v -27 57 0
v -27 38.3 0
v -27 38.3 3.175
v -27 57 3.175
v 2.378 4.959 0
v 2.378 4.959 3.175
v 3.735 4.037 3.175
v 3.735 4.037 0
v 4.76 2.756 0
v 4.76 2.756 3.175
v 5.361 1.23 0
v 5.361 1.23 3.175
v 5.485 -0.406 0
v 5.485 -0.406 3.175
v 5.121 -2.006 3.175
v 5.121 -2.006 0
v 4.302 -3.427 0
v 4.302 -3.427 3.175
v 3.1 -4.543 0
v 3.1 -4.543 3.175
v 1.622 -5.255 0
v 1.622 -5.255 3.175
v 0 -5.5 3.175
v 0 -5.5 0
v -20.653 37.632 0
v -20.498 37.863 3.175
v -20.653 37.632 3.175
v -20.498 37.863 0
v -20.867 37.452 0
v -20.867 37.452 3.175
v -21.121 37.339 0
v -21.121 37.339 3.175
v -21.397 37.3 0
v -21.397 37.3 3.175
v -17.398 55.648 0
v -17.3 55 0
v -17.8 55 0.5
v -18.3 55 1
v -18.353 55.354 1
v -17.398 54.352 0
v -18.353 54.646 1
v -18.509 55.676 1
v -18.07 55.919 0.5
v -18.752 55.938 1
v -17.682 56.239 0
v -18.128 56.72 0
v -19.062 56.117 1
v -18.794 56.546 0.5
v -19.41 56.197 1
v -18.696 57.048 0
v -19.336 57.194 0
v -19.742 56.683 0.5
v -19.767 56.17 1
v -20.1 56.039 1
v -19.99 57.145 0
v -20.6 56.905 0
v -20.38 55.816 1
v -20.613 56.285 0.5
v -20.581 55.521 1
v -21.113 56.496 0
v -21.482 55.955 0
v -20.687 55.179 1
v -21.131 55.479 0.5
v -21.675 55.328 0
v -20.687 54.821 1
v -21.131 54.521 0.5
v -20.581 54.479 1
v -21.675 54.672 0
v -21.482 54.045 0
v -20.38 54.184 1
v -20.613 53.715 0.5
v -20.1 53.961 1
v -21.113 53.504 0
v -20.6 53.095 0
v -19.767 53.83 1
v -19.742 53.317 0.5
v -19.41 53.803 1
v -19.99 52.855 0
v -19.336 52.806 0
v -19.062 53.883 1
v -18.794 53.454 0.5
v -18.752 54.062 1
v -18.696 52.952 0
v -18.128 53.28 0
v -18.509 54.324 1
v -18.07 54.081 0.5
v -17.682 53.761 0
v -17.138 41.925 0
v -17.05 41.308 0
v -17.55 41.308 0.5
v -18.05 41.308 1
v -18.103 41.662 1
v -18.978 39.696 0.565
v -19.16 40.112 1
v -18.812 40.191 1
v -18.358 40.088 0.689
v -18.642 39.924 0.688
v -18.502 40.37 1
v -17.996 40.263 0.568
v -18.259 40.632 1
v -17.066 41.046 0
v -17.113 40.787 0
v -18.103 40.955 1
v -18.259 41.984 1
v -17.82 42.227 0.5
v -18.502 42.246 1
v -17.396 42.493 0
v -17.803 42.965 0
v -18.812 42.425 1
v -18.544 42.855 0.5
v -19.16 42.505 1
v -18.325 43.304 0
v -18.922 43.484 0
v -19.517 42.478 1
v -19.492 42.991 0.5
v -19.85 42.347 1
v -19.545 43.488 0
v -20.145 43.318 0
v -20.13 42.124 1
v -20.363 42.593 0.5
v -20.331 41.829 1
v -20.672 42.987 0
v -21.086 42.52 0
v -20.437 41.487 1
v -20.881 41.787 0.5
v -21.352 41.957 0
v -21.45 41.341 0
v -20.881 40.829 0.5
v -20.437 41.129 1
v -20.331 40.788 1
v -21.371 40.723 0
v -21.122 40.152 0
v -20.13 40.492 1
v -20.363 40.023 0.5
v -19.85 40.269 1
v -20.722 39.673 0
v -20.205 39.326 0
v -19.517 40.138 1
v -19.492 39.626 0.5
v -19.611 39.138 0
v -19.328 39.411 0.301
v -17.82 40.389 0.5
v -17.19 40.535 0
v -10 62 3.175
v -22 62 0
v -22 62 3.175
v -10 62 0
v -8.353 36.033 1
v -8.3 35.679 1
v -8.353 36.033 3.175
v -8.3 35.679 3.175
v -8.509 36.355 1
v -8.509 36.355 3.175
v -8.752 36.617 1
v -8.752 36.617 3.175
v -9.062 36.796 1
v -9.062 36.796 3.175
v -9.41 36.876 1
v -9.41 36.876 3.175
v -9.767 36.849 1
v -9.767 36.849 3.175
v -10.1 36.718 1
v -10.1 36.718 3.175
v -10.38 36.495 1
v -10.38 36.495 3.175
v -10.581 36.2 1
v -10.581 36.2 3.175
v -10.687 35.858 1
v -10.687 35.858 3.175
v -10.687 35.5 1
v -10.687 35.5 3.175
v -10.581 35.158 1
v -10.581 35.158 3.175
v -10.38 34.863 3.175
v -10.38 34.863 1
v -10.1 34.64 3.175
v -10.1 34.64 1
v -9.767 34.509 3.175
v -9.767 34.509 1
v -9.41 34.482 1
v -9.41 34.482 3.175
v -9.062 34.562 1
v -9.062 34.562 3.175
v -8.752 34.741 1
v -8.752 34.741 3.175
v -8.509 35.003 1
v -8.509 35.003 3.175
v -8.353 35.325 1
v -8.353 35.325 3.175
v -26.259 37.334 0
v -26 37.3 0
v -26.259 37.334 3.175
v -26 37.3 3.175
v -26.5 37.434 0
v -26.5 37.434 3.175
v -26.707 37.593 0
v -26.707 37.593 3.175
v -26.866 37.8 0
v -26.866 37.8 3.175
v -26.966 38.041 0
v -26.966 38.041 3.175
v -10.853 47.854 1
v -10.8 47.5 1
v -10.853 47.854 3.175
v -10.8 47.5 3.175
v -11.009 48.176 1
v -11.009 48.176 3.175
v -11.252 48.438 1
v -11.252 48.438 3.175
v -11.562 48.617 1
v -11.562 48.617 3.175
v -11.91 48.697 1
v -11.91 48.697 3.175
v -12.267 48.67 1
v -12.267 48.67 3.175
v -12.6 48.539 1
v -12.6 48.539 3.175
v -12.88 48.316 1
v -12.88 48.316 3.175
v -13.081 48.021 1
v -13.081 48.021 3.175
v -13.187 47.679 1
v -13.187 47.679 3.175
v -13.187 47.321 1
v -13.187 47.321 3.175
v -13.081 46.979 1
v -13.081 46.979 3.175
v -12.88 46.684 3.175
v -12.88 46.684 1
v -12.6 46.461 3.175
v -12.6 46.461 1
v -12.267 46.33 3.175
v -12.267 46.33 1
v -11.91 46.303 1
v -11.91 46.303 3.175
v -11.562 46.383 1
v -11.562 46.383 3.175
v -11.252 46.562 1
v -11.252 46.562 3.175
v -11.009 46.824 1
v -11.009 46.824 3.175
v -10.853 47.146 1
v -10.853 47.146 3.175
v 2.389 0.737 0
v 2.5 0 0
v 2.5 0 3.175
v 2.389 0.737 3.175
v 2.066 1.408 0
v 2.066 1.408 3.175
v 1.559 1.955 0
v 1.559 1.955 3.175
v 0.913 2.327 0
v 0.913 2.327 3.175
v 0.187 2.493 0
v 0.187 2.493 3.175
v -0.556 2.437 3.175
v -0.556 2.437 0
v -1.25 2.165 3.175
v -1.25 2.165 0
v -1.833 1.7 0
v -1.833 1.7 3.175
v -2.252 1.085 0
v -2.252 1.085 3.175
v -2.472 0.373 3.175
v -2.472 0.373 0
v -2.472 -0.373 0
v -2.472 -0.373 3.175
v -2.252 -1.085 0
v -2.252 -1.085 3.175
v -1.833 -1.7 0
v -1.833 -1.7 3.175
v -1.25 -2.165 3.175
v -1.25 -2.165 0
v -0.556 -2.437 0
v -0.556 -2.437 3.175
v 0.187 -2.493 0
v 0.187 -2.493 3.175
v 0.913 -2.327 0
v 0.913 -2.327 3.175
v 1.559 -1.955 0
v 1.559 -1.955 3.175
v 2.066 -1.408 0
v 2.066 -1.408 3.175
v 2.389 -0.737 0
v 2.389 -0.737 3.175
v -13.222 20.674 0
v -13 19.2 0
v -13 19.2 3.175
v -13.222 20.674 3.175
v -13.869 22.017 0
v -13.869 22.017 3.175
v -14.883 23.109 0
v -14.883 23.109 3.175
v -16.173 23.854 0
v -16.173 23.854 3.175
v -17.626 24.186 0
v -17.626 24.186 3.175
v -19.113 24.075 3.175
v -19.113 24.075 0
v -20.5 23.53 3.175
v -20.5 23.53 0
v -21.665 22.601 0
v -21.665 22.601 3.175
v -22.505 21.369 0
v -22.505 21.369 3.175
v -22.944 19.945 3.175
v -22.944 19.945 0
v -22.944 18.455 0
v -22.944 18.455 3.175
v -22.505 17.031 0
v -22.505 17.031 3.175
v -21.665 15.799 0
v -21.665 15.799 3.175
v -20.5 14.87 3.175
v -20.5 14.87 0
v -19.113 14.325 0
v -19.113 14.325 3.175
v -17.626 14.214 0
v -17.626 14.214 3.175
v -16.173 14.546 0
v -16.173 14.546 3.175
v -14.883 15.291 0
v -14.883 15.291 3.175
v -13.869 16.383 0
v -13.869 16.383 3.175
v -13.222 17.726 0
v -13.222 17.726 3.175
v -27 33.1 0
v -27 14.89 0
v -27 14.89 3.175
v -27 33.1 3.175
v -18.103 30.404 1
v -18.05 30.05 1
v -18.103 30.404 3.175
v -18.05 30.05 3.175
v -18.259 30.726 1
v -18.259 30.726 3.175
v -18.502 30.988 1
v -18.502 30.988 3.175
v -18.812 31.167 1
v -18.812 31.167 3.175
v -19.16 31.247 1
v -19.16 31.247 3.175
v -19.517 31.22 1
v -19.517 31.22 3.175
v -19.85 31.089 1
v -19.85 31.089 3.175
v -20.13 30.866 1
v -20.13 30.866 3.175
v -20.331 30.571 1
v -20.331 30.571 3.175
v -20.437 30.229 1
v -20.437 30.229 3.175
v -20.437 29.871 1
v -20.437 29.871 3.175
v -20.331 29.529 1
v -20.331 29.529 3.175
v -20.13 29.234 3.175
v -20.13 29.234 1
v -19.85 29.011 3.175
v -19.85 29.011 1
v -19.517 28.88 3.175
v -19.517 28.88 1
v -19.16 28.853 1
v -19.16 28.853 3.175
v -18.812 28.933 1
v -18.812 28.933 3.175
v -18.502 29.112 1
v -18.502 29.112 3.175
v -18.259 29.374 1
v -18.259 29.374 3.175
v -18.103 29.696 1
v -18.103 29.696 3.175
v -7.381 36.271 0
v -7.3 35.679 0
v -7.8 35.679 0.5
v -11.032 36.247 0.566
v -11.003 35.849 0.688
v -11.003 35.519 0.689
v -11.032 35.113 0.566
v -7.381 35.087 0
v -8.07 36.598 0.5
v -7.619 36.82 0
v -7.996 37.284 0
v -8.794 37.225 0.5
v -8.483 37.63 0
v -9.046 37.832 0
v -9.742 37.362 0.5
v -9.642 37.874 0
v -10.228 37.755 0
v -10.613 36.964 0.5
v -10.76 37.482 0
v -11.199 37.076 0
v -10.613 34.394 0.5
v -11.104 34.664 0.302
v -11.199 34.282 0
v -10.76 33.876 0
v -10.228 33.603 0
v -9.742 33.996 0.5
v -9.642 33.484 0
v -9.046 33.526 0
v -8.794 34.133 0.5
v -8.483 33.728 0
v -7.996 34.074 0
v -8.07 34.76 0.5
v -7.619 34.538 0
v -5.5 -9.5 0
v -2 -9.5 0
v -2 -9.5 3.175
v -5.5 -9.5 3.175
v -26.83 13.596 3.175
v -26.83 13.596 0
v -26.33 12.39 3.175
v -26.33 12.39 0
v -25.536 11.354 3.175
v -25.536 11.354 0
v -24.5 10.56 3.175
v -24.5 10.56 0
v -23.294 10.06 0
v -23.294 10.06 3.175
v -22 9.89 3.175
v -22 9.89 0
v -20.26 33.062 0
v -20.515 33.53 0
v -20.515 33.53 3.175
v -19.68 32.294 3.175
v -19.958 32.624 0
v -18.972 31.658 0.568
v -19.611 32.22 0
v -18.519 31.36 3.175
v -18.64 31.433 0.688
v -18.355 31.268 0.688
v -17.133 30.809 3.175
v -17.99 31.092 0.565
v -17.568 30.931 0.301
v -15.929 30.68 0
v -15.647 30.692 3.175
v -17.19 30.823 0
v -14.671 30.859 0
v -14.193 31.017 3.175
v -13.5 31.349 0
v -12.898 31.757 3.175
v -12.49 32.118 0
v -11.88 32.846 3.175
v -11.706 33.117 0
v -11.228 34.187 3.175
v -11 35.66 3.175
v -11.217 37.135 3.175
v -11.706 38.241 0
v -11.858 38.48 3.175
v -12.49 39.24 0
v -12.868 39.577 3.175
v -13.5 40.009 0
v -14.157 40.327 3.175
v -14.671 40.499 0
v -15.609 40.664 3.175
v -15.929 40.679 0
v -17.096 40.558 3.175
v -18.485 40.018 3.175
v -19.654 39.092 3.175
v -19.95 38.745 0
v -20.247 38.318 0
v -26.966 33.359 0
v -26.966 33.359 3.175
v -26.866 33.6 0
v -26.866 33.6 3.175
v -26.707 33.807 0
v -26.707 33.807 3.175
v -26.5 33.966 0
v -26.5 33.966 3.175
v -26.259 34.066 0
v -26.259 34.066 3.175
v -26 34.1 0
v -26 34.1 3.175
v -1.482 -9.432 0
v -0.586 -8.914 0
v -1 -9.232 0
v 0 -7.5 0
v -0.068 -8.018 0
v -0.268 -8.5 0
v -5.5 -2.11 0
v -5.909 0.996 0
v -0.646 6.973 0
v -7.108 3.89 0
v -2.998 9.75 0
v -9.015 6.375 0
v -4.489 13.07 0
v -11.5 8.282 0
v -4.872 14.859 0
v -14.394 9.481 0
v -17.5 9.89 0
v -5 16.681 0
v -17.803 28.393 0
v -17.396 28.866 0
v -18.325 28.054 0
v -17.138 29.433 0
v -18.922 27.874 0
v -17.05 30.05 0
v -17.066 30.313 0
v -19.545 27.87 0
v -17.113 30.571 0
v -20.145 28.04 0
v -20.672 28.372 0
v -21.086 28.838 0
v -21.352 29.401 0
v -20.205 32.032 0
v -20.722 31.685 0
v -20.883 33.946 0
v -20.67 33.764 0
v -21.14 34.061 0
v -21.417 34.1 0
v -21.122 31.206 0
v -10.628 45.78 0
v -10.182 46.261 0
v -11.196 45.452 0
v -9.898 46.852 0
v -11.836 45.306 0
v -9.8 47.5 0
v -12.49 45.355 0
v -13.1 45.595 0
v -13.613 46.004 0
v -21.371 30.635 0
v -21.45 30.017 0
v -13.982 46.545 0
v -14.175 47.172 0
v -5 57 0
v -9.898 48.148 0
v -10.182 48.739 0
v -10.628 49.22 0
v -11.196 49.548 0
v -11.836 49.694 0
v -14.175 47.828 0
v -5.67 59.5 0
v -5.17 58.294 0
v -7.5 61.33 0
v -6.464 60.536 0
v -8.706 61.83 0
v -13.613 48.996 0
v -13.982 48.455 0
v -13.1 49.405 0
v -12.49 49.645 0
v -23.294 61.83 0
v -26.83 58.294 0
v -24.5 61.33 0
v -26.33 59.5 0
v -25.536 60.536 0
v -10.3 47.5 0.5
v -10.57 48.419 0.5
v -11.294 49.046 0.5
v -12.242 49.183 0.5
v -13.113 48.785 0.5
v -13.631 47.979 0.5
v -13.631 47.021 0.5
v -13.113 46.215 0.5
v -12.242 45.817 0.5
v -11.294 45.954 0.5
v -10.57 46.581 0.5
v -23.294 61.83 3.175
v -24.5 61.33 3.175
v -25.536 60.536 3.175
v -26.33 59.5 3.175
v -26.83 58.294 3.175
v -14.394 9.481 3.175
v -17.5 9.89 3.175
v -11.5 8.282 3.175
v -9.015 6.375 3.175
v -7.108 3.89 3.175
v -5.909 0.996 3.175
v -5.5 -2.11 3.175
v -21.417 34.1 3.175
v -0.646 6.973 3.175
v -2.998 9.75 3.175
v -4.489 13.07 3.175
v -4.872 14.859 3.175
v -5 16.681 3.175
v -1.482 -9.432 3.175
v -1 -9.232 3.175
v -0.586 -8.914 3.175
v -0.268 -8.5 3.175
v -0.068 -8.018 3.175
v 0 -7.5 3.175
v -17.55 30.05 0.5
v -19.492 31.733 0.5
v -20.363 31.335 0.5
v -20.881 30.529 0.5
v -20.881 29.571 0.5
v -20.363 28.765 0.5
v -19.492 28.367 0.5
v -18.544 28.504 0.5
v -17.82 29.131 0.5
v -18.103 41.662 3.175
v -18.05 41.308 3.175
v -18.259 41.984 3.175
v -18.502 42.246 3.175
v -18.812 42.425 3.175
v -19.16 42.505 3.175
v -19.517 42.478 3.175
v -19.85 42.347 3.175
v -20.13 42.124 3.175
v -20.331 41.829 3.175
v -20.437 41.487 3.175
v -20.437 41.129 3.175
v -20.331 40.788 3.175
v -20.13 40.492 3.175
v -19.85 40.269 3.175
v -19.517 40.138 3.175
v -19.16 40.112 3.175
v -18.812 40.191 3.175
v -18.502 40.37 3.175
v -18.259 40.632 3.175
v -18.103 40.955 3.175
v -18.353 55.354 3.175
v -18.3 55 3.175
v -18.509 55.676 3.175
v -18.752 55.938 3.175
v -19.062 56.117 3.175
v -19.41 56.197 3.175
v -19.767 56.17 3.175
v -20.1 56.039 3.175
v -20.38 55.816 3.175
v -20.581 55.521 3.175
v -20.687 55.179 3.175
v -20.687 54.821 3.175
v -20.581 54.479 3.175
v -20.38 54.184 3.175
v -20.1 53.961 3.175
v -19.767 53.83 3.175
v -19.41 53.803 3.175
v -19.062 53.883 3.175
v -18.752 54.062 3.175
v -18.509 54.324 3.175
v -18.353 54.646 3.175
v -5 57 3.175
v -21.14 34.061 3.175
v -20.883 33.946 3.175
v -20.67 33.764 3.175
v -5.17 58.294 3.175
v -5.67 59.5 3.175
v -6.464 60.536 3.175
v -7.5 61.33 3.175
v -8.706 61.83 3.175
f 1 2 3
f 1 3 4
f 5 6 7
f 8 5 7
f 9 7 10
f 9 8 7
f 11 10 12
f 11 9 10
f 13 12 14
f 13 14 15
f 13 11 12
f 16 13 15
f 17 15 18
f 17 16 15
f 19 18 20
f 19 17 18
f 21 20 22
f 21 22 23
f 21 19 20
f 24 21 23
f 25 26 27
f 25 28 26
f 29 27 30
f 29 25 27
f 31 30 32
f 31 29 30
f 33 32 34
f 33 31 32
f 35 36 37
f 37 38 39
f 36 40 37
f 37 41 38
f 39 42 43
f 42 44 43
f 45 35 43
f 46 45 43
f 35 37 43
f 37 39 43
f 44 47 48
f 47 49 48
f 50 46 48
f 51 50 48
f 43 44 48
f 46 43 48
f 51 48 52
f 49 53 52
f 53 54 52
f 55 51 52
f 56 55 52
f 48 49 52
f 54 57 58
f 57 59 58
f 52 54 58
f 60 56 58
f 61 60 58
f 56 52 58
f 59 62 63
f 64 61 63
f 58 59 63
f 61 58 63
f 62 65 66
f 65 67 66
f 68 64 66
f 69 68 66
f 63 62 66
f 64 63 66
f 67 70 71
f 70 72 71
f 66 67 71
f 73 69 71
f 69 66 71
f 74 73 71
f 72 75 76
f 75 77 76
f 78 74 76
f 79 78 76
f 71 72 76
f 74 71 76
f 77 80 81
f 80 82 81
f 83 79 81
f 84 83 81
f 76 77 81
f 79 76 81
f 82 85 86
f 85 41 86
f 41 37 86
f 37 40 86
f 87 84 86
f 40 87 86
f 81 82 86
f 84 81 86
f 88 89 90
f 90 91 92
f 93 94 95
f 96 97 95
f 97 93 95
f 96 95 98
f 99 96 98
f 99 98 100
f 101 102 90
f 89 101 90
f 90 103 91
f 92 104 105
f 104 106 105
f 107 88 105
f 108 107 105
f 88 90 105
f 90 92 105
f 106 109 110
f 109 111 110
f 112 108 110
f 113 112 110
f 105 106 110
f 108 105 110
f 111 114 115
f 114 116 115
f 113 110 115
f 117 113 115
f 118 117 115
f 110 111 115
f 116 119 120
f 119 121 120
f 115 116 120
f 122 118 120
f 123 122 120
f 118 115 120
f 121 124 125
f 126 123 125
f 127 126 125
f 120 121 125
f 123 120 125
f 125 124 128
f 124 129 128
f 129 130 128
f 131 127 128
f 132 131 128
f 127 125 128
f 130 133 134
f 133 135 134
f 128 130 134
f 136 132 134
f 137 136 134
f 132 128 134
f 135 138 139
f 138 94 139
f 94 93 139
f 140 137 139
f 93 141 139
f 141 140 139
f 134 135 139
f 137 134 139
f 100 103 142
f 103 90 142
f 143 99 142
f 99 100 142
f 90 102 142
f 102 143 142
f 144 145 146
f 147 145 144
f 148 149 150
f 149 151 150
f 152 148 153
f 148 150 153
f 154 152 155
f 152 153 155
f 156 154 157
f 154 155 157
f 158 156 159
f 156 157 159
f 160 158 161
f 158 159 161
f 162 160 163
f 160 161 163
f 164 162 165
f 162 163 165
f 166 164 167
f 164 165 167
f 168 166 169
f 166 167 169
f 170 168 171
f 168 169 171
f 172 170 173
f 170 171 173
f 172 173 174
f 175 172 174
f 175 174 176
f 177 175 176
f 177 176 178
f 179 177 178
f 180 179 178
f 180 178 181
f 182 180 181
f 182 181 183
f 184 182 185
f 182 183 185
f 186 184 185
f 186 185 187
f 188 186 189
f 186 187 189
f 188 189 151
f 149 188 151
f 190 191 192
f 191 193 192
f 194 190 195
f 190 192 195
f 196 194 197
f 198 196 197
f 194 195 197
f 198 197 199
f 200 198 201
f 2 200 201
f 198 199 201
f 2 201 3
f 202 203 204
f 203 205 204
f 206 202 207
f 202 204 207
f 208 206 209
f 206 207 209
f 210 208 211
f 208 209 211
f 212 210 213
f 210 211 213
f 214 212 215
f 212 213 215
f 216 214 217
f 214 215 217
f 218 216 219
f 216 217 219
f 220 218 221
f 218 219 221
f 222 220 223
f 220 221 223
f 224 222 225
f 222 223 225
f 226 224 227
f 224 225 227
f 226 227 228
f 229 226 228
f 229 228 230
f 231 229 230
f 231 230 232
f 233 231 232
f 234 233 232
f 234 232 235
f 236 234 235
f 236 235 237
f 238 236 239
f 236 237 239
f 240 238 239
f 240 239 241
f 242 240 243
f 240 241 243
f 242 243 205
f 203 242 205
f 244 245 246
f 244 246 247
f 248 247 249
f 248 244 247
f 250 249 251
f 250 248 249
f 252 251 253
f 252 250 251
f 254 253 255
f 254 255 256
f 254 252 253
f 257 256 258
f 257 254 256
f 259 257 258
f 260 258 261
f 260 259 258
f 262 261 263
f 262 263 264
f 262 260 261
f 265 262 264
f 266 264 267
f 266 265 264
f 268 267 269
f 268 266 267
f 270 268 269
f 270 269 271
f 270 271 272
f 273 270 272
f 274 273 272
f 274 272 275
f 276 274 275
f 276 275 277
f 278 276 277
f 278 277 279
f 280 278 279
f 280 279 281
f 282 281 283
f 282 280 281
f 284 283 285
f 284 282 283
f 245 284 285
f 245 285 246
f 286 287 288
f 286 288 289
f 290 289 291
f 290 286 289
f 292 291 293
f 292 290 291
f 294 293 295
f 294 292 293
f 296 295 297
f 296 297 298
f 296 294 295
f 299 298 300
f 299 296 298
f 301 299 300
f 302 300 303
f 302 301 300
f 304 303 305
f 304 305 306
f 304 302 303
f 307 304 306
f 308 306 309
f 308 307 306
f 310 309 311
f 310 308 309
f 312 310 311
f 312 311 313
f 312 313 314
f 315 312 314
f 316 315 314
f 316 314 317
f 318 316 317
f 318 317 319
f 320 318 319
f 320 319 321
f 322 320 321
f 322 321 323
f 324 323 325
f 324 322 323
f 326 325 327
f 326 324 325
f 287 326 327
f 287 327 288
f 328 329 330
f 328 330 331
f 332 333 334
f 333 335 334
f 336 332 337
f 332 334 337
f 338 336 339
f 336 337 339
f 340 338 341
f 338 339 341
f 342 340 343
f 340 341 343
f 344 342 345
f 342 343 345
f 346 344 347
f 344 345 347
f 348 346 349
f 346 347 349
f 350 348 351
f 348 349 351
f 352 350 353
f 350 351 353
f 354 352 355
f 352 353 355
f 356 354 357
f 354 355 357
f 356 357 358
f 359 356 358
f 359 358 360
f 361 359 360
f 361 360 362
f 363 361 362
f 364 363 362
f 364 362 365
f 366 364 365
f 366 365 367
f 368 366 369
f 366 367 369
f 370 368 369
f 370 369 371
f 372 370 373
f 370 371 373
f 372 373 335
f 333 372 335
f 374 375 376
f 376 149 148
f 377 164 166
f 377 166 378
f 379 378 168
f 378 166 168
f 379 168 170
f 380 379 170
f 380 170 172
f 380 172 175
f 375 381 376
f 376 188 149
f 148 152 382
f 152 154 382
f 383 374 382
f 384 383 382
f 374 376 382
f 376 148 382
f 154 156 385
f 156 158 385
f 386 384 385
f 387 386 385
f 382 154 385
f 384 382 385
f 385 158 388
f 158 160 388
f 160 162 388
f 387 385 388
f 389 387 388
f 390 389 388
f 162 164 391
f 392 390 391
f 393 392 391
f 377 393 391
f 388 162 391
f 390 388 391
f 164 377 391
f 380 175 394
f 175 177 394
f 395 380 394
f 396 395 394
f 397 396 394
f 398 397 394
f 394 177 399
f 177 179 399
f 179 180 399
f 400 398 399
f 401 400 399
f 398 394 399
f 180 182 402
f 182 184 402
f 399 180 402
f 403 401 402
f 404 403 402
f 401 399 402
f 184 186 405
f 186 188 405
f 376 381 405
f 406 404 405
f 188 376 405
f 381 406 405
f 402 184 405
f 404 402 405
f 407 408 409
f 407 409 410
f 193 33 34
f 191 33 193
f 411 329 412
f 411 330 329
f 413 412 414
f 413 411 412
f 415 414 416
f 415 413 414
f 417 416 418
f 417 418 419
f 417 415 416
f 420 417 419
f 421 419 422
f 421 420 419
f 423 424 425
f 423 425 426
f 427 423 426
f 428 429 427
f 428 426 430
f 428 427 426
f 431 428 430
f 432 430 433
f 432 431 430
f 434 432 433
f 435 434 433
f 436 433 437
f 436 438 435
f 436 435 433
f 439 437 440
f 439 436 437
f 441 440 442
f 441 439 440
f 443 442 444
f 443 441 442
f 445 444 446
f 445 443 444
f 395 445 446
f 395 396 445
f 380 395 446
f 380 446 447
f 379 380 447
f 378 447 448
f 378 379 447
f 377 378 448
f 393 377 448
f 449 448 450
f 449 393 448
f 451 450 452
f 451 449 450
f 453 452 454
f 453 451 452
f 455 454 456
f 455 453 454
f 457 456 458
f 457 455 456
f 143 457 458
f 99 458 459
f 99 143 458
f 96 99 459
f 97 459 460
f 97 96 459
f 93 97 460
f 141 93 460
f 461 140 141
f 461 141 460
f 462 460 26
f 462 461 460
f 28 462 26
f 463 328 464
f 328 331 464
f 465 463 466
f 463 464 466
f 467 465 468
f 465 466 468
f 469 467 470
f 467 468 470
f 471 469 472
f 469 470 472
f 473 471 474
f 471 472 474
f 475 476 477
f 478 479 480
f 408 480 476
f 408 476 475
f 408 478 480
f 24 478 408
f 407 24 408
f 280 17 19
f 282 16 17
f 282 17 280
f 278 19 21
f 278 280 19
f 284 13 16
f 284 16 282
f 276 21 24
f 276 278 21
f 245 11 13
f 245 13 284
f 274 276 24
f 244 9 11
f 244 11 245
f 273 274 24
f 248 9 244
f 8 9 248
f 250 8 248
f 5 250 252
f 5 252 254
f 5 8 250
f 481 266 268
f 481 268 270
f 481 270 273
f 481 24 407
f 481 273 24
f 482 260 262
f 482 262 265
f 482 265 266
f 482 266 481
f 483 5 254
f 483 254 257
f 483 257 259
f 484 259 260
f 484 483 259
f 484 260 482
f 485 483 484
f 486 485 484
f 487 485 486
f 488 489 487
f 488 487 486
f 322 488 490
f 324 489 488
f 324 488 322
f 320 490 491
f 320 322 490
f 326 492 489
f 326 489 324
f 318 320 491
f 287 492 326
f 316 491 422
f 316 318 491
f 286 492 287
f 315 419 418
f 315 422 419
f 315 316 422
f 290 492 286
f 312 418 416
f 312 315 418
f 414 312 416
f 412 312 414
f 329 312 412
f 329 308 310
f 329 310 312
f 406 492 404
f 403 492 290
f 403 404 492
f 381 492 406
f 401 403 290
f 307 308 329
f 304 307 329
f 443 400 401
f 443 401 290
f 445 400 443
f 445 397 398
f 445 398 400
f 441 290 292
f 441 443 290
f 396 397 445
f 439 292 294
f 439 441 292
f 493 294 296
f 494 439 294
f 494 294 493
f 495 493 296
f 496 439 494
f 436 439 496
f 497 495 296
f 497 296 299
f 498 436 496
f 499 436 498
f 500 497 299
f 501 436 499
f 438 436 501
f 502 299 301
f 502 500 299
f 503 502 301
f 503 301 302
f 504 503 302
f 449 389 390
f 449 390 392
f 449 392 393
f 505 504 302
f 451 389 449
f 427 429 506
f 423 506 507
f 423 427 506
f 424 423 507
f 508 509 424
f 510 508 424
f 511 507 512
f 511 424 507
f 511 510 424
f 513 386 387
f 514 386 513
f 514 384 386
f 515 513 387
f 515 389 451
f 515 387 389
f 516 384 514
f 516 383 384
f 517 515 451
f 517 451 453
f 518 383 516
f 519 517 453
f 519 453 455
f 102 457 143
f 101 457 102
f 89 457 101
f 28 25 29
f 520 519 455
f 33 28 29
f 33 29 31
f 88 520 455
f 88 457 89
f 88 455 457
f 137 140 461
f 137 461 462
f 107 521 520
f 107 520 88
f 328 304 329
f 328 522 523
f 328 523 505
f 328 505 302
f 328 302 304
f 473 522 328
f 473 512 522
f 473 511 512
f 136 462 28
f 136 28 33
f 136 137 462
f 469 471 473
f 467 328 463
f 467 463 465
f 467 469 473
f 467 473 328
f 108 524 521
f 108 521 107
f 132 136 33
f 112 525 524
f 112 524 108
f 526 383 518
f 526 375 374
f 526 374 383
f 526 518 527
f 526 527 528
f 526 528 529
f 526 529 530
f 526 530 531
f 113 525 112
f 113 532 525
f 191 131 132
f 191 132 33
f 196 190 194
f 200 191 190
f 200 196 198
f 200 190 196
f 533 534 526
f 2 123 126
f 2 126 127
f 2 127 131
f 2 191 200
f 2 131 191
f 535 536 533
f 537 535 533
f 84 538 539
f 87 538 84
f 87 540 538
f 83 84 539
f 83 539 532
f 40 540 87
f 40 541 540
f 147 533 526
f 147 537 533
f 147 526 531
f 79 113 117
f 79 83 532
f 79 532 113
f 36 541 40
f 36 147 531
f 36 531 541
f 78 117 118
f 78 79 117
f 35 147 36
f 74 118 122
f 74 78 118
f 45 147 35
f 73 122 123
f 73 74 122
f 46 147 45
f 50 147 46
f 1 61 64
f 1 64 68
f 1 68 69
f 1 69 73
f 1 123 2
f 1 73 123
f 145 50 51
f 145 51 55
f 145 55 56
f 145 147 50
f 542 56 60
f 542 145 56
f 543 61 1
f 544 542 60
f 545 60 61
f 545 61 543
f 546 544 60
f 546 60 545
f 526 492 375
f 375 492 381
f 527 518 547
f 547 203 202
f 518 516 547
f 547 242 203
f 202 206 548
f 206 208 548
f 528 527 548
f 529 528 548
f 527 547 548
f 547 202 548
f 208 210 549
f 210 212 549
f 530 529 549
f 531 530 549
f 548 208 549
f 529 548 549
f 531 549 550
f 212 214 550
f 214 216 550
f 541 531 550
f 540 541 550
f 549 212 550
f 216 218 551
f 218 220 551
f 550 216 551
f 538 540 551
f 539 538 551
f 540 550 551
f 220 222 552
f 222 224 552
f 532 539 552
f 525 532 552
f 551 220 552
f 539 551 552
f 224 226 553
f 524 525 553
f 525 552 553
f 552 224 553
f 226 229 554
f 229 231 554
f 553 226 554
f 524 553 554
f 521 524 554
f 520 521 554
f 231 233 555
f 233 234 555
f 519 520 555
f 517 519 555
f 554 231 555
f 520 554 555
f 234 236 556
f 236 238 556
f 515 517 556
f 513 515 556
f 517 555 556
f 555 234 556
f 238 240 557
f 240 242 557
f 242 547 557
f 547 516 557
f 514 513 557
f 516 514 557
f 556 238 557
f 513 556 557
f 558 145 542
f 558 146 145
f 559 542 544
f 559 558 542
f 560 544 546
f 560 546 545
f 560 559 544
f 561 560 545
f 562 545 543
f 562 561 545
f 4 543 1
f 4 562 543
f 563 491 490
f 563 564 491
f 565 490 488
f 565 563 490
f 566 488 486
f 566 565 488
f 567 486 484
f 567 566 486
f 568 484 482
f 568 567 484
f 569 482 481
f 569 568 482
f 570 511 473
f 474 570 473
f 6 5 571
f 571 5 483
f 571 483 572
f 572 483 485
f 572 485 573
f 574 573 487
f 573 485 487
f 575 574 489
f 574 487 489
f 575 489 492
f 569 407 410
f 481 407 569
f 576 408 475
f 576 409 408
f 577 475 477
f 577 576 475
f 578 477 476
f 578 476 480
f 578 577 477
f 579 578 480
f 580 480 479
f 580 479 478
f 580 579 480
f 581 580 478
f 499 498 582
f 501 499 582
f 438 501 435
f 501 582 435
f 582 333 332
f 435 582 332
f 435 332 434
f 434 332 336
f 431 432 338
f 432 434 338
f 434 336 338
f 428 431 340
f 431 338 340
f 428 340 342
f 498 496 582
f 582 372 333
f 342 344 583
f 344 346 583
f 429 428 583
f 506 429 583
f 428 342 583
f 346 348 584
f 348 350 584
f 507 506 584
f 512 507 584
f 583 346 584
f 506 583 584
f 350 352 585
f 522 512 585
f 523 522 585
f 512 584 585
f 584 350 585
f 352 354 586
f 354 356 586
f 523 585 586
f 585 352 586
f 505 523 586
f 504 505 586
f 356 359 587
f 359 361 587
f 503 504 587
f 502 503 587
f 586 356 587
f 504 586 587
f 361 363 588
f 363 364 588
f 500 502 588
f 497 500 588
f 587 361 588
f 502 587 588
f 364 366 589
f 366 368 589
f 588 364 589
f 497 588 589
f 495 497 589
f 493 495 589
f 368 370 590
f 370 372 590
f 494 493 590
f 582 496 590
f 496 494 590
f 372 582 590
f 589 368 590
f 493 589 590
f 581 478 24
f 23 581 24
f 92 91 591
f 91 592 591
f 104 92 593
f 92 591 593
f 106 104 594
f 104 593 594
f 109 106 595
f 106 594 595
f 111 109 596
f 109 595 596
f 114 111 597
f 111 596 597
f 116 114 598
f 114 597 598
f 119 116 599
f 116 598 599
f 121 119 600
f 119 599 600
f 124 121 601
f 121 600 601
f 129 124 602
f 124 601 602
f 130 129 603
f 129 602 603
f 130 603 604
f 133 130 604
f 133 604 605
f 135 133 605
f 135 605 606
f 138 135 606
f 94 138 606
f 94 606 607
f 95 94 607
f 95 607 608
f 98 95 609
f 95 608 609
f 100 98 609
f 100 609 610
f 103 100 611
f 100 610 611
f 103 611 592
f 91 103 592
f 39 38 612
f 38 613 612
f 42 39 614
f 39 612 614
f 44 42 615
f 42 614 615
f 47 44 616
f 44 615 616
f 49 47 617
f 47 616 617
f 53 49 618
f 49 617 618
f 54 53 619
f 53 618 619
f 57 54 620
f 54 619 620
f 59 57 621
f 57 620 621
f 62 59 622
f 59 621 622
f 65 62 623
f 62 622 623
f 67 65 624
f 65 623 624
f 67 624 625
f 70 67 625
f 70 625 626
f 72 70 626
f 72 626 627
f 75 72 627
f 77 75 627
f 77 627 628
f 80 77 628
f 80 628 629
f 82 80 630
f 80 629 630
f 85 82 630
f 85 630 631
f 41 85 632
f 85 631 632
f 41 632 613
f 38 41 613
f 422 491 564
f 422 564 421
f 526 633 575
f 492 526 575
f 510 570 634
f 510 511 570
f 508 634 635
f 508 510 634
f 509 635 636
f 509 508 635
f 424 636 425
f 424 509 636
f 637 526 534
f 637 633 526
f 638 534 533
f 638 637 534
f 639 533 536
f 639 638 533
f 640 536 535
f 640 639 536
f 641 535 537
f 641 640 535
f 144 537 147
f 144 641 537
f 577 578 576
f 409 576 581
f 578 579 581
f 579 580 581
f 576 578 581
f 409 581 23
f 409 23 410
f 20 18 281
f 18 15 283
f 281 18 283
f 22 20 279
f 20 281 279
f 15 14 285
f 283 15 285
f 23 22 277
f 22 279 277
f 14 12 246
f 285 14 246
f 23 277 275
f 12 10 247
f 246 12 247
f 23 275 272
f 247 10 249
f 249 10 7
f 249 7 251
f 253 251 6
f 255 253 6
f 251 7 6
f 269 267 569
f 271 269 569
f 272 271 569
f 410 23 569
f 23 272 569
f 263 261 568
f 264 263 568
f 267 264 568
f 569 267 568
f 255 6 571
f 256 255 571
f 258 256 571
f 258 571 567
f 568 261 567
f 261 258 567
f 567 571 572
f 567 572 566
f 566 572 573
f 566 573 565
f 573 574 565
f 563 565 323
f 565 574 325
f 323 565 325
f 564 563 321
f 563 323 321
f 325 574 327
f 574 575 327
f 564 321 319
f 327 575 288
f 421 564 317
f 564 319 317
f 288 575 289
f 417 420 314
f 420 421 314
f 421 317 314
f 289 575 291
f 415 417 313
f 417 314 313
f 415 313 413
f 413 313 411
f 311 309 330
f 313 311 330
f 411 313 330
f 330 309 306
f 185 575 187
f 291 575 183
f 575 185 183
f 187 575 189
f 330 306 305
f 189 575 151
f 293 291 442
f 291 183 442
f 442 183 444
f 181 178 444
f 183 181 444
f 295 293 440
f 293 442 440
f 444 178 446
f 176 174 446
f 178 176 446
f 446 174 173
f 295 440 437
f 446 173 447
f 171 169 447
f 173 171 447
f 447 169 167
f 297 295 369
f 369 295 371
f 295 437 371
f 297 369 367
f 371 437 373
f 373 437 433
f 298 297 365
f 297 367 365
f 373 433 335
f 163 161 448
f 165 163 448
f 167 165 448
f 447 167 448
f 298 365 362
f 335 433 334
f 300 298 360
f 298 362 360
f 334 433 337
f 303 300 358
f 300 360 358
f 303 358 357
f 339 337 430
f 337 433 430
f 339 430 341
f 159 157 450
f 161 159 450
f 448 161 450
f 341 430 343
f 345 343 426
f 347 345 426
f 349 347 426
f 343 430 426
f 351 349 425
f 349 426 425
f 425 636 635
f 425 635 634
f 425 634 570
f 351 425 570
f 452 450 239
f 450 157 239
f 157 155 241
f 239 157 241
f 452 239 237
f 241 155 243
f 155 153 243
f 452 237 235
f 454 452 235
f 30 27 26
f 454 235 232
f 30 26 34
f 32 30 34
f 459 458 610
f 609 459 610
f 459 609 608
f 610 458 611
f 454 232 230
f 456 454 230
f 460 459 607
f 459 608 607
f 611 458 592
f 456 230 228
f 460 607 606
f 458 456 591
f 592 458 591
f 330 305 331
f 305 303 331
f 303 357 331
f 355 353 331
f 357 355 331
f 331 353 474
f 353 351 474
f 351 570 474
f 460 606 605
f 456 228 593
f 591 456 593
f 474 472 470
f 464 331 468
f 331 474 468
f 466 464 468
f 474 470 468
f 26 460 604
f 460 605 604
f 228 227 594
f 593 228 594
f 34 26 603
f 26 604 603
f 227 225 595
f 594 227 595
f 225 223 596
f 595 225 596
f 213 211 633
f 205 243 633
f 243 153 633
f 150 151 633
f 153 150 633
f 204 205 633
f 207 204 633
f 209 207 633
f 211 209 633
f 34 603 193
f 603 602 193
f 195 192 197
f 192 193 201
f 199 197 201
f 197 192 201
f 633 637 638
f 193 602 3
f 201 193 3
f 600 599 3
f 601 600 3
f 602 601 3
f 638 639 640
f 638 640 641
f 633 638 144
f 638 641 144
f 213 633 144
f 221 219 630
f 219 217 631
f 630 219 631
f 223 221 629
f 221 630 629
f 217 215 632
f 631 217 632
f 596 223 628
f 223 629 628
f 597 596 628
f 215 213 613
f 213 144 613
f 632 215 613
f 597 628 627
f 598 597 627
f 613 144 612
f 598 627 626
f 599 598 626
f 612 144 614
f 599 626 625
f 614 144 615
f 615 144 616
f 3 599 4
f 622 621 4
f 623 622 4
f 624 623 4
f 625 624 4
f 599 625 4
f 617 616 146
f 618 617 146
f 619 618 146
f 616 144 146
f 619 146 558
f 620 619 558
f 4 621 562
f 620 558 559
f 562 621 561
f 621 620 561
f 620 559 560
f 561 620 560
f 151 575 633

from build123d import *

# Parameters (mm, degrees)
SKETCH1_R                                       = 2.5
SKETCH1_R_2                                     = 5
SKETCH1_R_3                                     = 1
BOSS_EXTRUDE1_DEPTH                             = 3.175
CSK_FOR_M2_FLAT_HEAD_MACHINE_SCREW1_D           = 2.4
CSK_FOR_M2_FLAT_HEAD_MACHINE_SCREW1_CSINK_D     = 4.4
CSK_FOR_M2_FLAT_HEAD_MACHINE_SCREW1_CSINK_ANGLE = 90
SKETCH6_W                                       = 8
SKETCH6_H                                       = 3.2
MOTORSHAFTCUTOUT_DEPTH                          = 68.698453638
F_5MM_FILLET_R                                  = 5
F_1MM_FILLET_R                                  = 1
CUT_EXTRUDE1_DEPTH                              = 68.698453638
FILLET1_R                                       = 5
SKETCH8_W                                       = 5.5
SKETCH8_H                                       = 4
BOSS_EXTRUDE2_DEPTH                             = 3.175
BOSS_EXTRUDE3_DEPTH                             = 3.175
CUT_EXTRUDE3_DEPTH                              = 68.698453638
CUT_EXTRUDE3_DEPTH_BACK                         = 10
FILLET3_R                                       = 12
FILLET4_R                                       = 2
FILLET6_R                                       = 13
CSK_FOR_M2_FLAT_HEAD_MACHINE_SCREW3_D           = 2.4
CSK_FOR_M2_FLAT_HEAD_MACHINE_SCREW3_CSINK_D     = 4.4
CSK_FOR_M2_FLAT_HEAD_MACHINE_SCREW3_CSINK_ANGLE = 90


with BuildPart() as part:
    # Sketch1 → Boss-Extrude1 (new body)
    with BuildSketch(Plane.XY):
        with BuildLine():
            Line((0, -5.5), (-7, -5.5))
            Line((-7, -5.5), (-7, -9))
            Line((-7, -9), (-12, -9))
            Line((-12, -9), (-12, -2.5))
            Line((-12, -2.5), (-27, 4.494614872))
            Line((-27, 4.494614872), (-27, 62))
            Line((-27, 62), (-5, 62))
            Line((-5, 62), (-5, 32.19632141))
            Line((-5, 32.19632141), (-9, 28.19632141))
            Line((-9, 28.19632141), (-9, 10.265347478))
            Line((-9, 10.265347478), (2.32440044, 4.984692829))
            ThreePointArc((2.32440044, 4.984692829), (5.369628039, -1.190417877), (0, -5.5))
        make_face()
        Circle(SKETCH1_R, mode=Mode.SUBTRACT)
        with Locations((-18, 19.2)):
            Circle(SKETCH1_R_2, mode=Mode.SUBTRACT)
        with Locations((-16, 35.679077644)):
            Circle(SKETCH1_R_2, mode=Mode.SUBTRACT)
        with Locations((-9.5, 35.679077644)):
            Circle(SKETCH1_R_3, mode=Mode.SUBTRACT)
        with Locations((-19.25, 30.049912519)):
            Circle(SKETCH1_R_3, mode=Mode.SUBTRACT)
        with Locations((-19.25, 41.308242769)):
            Circle(SKETCH1_R_3, mode=Mode.SUBTRACT)
    extrude(amount=BOSS_EXTRUDE1_DEPTH)

    # CSK for M2 Flat Head Machine Screw1 (through all)
    with Locations(Plane(origin=(0, 0, 0), x_dir=(-1, 0, 0), z_dir=(0, 0, -1))):
        with Locations((19.5, 55), (12, 47.5)):
            CounterSinkHole(CSK_FOR_M2_FLAT_HEAD_MACHINE_SCREW1_D / 2, CSK_FOR_M2_FLAT_HEAD_MACHINE_SCREW1_CSINK_D / 2, counter_sink_angle=CSK_FOR_M2_FLAT_HEAD_MACHINE_SCREW1_CSINK_ANGLE)

    # Sketch6 → MotorShaftCutOut (cut, through all)
    with BuildSketch(Plane(origin=(0, 0, 0), x_dir=(-1, 0, 0), z_dir=(0, 0, -1))):
        with Locations((23, 35.7)):
            Rectangle(SKETCH6_W, SKETCH6_H)
    extrude(amount=-MOTORSHAFTCUTOUT_DEPTH, mode=Mode.SUBTRACT)

    # 5mm_Fillet
    f_5mm_fillet_edges = [part.edges().sort_by_distance(p)[0] for p in [
        (-12, -2.5, 1.5875),
        (-27, 4.494614872, 1.5875),
        (-27, 62, 1.5875),
        (-5, 62, 1.5875),
        (-5, 32.19632141, 1.5875),
        (-9, 28.19632141, 1.5875),
        (-9, 10.265347478, 1.5875),
    ]]
    fillet(f_5mm_fillet_edges, radius=F_5MM_FILLET_R)

    # 1mm_Fillet
    f_1mm_fillet_edges = [part.edges().sort_by_distance(p)[0] for p in [
        (-7, -5.5, 1.5875),
        (-7, -9, 1.5875),
        (-20.744103055, 34.1, 1.5875),
        (-20.72996942, 37.3, 1.5875),
        (-27, 34.1, 1.5875),
        (-27, 37.3, 1.5875),
    ]]
    fillet(f_1mm_fillet_edges, radius=F_1MM_FILLET_R)

    # Sketch7 → Cut-Extrude1 (cut, through all)
    with BuildSketch(Plane(origin=(0, 0, 0), x_dir=(-1, 0, 0), z_dir=(0, 0, -1))):
        with BuildLine():
            Line((12.047193362, -5), (17.277217948, 6.901547918))
            ThreePointArc((17.277217948, 6.901547918), (19.121399551, 9.076749311), (21.854736378, 9.89))
            Line((21.854736378, 9.89), (27, 9.89))
            Line((27, 9.89), (27, -5))
            Line((27, -5), (12.047193362, -5))
        make_face()
    extrude(amount=-CUT_EXTRUDE1_DEPTH, mode=Mode.SUBTRACT)

    # Fillet1
    fillet1_edges = [part.edges().sort_by_distance(p)[0] for p in [
        (-27, 9.89, 1.5875),
    ]]
    fillet(fillet1_edges, radius=FILLET1_R)

    # Sketch8 → Boss-Extrude2 (add)
    with BuildSketch(Plane(origin=(0, 0, 0), x_dir=(-1, 0, 0), z_dir=(0, 0, -1))):
        with Locations((2.75, -7.5)):
            Rectangle(SKETCH8_W, SKETCH8_H)
    extrude(amount=-BOSS_EXTRUDE2_DEPTH)

    # Sketch9 → Boss-Extrude3 (add)
    with BuildSketch(Plane.XY.offset(3.175)):
        with BuildLine():
            Line((-5, 34.267389222), (-5, 8.400116845))
            Line((-5, 8.400116845), (-6.113091309, 8.919159847))
            ThreePointArc((-6.113091309, 8.919159847), (-8.216957229, 10.76420074), (-9, 13.450698782))
            Line((-9, 13.450698782), (-9, 26.125253598))
            ThreePointArc((-9, 26.125253598), (-8.619397663, 28.03867076), (-7.535533906, 29.660787504))
            Line((-7.535533906, 29.660787504), (-6.464466094, 30.731855316))
            ThreePointArc((-6.464466094, 30.731855316), (-5.380602337, 32.35397206), (-5, 34.267389222))
        make_face()
    extrude(amount=-BOSS_EXTRUDE3_DEPTH)

    # Sketch10 → Cut-Extrude3 (cut, two sides: drawn at the far end of the back side and taken through both)
    with BuildSketch(Plane.XY.offset(3.175).offset(-CUT_EXTRUDE3_DEPTH_BACK)):
        with BuildLine():
            Line((-5.5, 9.89), (-21.854736378, 9.89))
            ThreePointArc((-21.854736378, 9.89), (-19.121399551, 9.076749311), (-17.277217948, 6.901547918))
            Line((-17.277217948, 6.901547918), (-13.145595024, -2.500455344))
            ThreePointArc((-13.145595024, -2.500455344), (-12.327289124, -3.906089359), (-12.003436692, -5.5))
            Line((-12.003436692, -5.5), (-6, -5.5))
            Line((-6, -5.5), (-5.5, -5.5))
            Line((-5.5, -5.5), (-5.5, 9.89))
        make_face()
    extrude(amount=CUT_EXTRUDE3_DEPTH + CUT_EXTRUDE3_DEPTH_BACK, mode=Mode.SUBTRACT)


with BuildPart() as body_2:
    # of the pieces the cut leaves, the one that is kept (cut_extrude3_keep)
    add(part.part.solids().sort_by_distance((-22, 9.89, 3.175))[0])

    # Fillet3
    fillet3_edges = [body_2.edges().sort_by_distance(p)[0] for p in [
        (-5.5, 9.89, 1.5875),
    ]]
    fillet(fillet3_edges, radius=FILLET3_R)

    # Fillet4
    fillet4_edges = [body_2.edges().sort_by_distance(p)[0] for p in [
        (0, -9.5, 1.5875),
    ]]
    fillet(fillet4_edges, radius=FILLET4_R)

    # Fillet6
    fillet6_edges = [body_2.edges().sort_by_distance(p)[0] for p in [
        (-5, 8.400116845, 1.5875),
    ]]
    fillet(fillet6_edges, radius=FILLET6_R)

    # CSK for M2 Flat Head Machine Screw3 (through all)
    with Locations(Plane(origin=(0, 0, 0), x_dir=(-1, 0, 0), z_dir=(0, 0, -1))):
        with Locations((19.25, 41.308242769), (9.5, 35.679077644), (19.25, 30.049912519)):
            CounterSinkHole(CSK_FOR_M2_FLAT_HEAD_MACHINE_SCREW3_D / 2, CSK_FOR_M2_FLAT_HEAD_MACHINE_SCREW3_CSINK_D / 2, counter_sink_angle=CSK_FOR_M2_FLAT_HEAD_MACHINE_SCREW3_CSINK_ANGLE)


solid = body_2.part
